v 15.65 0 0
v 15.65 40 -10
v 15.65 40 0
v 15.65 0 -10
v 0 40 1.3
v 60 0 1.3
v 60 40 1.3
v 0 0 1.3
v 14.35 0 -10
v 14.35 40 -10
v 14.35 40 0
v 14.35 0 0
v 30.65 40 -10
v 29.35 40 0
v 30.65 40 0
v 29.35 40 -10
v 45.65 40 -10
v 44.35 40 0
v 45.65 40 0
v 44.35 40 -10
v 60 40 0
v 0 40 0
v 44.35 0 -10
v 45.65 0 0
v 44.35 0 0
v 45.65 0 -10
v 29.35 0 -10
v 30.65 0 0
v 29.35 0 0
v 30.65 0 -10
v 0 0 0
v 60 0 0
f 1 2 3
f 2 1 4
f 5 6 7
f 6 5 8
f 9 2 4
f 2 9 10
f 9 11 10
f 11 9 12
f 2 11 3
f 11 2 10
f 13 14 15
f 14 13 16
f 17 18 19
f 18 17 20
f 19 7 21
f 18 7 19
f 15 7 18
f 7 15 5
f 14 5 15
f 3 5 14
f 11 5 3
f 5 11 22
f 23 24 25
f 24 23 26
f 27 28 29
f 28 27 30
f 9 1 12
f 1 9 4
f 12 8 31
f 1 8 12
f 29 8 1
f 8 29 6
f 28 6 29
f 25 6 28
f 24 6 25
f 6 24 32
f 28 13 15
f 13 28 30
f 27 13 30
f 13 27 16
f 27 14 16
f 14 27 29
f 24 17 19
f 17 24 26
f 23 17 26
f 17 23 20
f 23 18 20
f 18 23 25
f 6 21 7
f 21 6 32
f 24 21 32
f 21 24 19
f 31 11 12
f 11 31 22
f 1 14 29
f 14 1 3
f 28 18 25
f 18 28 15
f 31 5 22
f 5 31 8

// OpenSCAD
$fn = 32;

// ----------------------------------------------------------------------
// Ribbed panel: 1.3 mm panel
// ----------------------------------------------------------------------

// --- parameters (mm) ---
panel_l = 60;             // panel length, X
panel_w = 40;             // panel width, Y
panel_t = 1.3;            // panel thickness, Z
rib_t = 1.3;              // rib thickness
rib_h = 10;               // rib height below the panel
ribs = 3;                 // number of ribs

total_h = panel_t + rib_h;  // overall height

union() {
  cube([panel_l, panel_w, panel_t]);
  for (i = [1 : ribs])
    translate([i * panel_l / (ribs + 1) - rib_t / 2, 0, -rib_h])
      cube([rib_t, panel_w, rib_h + panel_t]);
}
